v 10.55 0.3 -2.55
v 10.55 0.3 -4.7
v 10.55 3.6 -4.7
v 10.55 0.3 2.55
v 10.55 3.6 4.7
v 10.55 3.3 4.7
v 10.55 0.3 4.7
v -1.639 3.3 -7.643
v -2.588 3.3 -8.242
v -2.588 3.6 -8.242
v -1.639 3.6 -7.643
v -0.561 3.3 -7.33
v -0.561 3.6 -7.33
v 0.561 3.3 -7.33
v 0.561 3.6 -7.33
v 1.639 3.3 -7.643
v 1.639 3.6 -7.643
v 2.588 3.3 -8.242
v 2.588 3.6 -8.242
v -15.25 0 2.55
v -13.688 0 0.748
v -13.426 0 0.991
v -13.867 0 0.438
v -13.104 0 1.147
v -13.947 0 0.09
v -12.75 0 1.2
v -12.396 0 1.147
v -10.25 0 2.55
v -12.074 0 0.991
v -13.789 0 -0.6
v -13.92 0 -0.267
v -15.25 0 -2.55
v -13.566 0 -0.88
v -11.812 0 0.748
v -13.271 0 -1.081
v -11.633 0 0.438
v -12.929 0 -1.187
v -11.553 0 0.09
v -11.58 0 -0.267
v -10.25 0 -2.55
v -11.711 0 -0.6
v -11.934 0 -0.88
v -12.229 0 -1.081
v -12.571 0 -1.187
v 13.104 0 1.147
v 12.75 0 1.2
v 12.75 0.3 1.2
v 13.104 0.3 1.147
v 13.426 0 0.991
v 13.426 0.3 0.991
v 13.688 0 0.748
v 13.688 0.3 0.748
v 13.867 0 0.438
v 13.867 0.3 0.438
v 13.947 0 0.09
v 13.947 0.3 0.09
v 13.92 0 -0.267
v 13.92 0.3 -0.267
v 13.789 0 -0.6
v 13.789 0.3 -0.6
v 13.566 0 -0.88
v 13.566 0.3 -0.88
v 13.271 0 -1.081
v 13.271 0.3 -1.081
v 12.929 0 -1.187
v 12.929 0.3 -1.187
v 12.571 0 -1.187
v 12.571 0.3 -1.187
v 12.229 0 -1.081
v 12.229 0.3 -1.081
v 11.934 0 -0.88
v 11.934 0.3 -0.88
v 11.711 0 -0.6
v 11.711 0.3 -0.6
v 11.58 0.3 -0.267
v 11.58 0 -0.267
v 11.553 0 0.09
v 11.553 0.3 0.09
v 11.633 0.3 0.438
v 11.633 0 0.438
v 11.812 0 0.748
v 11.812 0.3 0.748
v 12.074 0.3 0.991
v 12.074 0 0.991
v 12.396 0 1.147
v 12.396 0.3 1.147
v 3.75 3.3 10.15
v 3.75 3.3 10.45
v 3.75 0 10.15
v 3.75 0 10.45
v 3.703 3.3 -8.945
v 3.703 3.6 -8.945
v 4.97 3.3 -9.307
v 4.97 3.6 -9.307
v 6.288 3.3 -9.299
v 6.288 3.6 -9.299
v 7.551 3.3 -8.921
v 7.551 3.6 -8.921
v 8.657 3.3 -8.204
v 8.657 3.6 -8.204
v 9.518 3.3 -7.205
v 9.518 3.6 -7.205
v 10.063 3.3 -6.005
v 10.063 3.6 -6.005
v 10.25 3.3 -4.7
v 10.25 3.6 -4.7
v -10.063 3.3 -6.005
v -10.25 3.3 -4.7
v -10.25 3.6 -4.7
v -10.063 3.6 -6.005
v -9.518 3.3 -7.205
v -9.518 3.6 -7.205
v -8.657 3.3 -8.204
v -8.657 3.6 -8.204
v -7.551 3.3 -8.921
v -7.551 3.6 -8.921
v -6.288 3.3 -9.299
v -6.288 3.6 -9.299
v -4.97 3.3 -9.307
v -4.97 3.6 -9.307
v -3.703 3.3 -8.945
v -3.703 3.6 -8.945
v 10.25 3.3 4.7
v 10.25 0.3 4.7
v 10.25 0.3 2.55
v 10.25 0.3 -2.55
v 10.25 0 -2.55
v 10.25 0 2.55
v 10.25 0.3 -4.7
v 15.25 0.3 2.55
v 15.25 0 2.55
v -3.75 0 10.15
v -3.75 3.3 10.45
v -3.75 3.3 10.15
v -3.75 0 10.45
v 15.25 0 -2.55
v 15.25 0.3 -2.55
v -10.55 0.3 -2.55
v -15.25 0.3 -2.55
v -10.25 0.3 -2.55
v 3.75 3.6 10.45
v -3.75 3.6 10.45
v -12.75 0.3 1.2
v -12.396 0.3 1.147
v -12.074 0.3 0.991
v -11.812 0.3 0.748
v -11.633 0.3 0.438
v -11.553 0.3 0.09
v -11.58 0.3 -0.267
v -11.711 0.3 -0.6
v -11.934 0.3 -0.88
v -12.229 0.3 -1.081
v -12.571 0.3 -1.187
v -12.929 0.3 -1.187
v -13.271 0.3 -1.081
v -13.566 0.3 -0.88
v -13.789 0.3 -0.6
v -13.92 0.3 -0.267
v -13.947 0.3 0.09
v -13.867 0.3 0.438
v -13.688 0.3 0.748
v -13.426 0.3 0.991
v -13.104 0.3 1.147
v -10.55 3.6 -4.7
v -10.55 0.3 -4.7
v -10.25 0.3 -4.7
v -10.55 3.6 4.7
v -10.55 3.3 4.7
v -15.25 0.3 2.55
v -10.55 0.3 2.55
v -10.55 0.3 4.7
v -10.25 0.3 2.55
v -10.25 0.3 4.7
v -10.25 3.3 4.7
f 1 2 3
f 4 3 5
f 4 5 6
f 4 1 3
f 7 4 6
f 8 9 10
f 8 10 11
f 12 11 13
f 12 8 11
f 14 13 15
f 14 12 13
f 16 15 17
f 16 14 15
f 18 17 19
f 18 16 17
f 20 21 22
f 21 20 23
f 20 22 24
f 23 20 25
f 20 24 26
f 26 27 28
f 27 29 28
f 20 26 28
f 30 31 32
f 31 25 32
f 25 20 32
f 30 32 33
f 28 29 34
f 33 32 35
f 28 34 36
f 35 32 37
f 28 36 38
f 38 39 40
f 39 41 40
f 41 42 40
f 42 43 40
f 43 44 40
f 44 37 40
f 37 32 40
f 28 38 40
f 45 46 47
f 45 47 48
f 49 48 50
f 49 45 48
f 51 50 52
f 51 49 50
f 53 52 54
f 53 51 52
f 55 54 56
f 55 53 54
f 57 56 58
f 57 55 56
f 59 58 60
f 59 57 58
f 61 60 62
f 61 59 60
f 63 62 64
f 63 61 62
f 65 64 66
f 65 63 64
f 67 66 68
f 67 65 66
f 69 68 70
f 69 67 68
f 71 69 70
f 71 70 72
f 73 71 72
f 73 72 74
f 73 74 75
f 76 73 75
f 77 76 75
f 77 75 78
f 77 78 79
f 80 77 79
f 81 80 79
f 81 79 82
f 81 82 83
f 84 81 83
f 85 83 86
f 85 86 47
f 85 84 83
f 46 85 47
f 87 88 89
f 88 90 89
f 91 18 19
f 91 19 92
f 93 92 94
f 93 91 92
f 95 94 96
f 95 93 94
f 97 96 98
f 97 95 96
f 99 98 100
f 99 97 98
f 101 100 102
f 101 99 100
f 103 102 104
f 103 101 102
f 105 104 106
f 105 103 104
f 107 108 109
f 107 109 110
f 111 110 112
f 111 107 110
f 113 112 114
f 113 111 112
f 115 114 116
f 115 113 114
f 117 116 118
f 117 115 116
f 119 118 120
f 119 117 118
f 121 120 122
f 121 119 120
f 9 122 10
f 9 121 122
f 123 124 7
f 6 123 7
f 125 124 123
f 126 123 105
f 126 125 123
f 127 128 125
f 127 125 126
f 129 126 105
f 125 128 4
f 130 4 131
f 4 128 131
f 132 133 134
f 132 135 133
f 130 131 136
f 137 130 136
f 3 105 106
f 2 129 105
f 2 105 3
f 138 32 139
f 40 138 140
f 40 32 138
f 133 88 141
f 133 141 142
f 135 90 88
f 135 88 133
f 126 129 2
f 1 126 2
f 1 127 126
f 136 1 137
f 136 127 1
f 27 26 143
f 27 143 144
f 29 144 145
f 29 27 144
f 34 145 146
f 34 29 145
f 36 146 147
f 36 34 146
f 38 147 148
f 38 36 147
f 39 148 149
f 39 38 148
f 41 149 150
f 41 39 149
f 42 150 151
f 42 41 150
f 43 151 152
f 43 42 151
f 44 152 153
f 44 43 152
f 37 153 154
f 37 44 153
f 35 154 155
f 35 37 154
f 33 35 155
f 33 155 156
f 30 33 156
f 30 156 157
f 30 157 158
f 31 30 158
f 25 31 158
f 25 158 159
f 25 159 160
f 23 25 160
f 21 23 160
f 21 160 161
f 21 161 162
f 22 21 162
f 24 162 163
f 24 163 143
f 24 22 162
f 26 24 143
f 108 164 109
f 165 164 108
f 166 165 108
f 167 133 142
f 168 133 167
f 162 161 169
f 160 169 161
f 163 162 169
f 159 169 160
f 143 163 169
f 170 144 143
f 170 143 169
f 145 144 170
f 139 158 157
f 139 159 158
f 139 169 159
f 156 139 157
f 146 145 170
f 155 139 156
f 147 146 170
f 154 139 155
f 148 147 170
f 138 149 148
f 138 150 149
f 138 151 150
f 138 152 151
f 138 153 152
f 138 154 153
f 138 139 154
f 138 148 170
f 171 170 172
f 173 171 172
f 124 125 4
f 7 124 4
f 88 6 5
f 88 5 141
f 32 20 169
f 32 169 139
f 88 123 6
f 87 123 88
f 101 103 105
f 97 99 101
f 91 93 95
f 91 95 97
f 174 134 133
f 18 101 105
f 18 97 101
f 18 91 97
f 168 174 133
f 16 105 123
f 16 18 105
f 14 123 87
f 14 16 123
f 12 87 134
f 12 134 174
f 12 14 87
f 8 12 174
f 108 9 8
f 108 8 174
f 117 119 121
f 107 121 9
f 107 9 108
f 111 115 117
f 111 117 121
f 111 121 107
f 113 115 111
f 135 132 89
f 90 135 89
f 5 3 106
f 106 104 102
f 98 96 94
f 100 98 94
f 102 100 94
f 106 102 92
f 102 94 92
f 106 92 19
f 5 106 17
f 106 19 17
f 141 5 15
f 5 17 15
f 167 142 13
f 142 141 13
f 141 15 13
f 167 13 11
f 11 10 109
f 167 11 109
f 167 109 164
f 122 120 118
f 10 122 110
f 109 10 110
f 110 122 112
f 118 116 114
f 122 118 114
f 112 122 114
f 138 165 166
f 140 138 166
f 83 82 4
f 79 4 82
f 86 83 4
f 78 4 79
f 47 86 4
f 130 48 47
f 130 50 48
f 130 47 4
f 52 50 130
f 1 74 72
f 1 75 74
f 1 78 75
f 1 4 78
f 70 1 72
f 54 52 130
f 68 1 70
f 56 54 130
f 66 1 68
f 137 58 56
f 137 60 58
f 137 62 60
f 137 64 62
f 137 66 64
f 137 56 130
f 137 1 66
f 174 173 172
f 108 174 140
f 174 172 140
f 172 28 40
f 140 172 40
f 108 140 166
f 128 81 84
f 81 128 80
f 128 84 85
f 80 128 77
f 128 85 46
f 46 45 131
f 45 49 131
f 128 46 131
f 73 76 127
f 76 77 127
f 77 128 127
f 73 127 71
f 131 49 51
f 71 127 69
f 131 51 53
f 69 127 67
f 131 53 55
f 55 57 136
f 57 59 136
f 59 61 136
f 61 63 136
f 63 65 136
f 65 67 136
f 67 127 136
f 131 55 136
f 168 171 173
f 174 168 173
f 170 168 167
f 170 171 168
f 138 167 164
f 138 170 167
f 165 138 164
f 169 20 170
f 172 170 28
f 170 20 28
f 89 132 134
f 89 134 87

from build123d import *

# Parameters (mm, degrees)
SKETCH1_W             = 5
SKETCH1_H             = 5.1
SKETCH1_R             = 1.2
BOSS_EXTRUDE1_DEPTH   = 0.3
BOSS_EXTRUDE1_2_DEPTH = 0.3
SKETCH1_W_2           = 7.5
SKETCH1_H_2           = 0.3
BOSS_EXTRUDE1_3_DEPTH = 0.3
SKETCH2_W             = 0.3
SKETCH2_H             = 9.4
SKETCH2_W_2           = 7.5
SKETCH2_H_2           = 0.3
BOSS_EXTRUDE2_DEPTH   = 3
BOSS_EXTRUDE3_DEPTH   = 0.3


with BuildPart() as part:
    # Sketch1 → Boss-Extrude1 (new body)
    with BuildSketch(Plane(origin=(0, 0, 0), x_dir=(1, 0, 0), z_dir=(0, 1, 0))):
        with Locations((-12.75, 0)):
            Rectangle(SKETCH1_W, SKETCH1_H)
        with Locations(Location((-12.75, 0, 0), (0, 0, 270))):
            Circle(SKETCH1_R, mode=Mode.SUBTRACT)
    extrude(amount=BOSS_EXTRUDE1_DEPTH)



with BuildPart() as body_2:
    # Sketch1 → Boss-Extrude1 2 (new body)
    with BuildSketch(Plane(origin=(0, 0, 0), x_dir=(1, 0, 0), z_dir=(0, 1, 0))):
        with Locations((12.75, 0)):
            Rectangle(SKETCH1_W, SKETCH1_H)
        with Locations(Location((12.75, 0, 0), (0, 0, 270))):
            Circle(SKETCH1_R, mode=Mode.SUBTRACT)
    extrude(amount=BOSS_EXTRUDE1_2_DEPTH)


with BuildPart() as body_3:
    # Sketch1 → Boss-Extrude1 3 (new body)
    with BuildSketch(Plane(origin=(0, 0, 0), x_dir=(1, 0, 0), z_dir=(0, 1, 0))):
        with Locations((0, -10.3)):
            Rectangle(SKETCH1_W_2, SKETCH1_H_2)
    extrude(amount=BOSS_EXTRUDE1_3_DEPTH)


with BuildPart() as part_1:
    add(part.part)

    add(body_2.part)  # Boss-Extrude2 merges body 2

    add(body_3.part)  # Boss-Extrude2 merges body 3
    # Sketch2 → Boss-Extrude2 (add)
    with BuildSketch(Plane(origin=(0, 0.3, 0), x_dir=(1, 0, 0), z_dir=(0, 1, 0))):
        with Locations((-10.4, 0)):
            Rectangle(SKETCH2_W, SKETCH2_H)
        with Locations((10.4, 0)):
            Rectangle(SKETCH2_W, SKETCH2_H)
        with Locations((0, -10.3)):
            Rectangle(SKETCH2_W_2, SKETCH2_H_2)
    extrude(amount=BOSS_EXTRUDE2_DEPTH)

    # Sketch3 → Boss-Extrude3 (add)
    with BuildSketch(Plane(origin=(0, 3.3, 0), x_dir=(1, 0, 0), z_dir=(0, 1, 0))):
        with BuildLine():
            Line((-3.75, -10.45), (-10.55, -4.7))
            Line((-10.55, -4.7), (-10.55, 4.7))
            Line((-10.55, 4.7), (-10.25, 4.7))
            ThreePointArc((-10.25, 4.7), (-7.551234557, 8.92080368), (-2.587555397, 8.242270108))
            ThreePointArc((-2.587555397, 8.242270108), (0, 7.290779594), (2.587555397, 8.242270108))
            ThreePointArc((2.587555397, 8.242270108), (7.551234557, 8.92080368), (10.25, 4.7))
            Line((10.25, 4.7), (10.55, 4.7))
            Line((10.55, 4.7), (10.55, -4.7))
            Line((10.55, -4.7), (3.75, -10.45))
            Line((3.75, -10.45), (-3.75, -10.45))
        make_face()
    extrude(amount=BOSS_EXTRUDE3_DEPTH)


solid = part_1.part
